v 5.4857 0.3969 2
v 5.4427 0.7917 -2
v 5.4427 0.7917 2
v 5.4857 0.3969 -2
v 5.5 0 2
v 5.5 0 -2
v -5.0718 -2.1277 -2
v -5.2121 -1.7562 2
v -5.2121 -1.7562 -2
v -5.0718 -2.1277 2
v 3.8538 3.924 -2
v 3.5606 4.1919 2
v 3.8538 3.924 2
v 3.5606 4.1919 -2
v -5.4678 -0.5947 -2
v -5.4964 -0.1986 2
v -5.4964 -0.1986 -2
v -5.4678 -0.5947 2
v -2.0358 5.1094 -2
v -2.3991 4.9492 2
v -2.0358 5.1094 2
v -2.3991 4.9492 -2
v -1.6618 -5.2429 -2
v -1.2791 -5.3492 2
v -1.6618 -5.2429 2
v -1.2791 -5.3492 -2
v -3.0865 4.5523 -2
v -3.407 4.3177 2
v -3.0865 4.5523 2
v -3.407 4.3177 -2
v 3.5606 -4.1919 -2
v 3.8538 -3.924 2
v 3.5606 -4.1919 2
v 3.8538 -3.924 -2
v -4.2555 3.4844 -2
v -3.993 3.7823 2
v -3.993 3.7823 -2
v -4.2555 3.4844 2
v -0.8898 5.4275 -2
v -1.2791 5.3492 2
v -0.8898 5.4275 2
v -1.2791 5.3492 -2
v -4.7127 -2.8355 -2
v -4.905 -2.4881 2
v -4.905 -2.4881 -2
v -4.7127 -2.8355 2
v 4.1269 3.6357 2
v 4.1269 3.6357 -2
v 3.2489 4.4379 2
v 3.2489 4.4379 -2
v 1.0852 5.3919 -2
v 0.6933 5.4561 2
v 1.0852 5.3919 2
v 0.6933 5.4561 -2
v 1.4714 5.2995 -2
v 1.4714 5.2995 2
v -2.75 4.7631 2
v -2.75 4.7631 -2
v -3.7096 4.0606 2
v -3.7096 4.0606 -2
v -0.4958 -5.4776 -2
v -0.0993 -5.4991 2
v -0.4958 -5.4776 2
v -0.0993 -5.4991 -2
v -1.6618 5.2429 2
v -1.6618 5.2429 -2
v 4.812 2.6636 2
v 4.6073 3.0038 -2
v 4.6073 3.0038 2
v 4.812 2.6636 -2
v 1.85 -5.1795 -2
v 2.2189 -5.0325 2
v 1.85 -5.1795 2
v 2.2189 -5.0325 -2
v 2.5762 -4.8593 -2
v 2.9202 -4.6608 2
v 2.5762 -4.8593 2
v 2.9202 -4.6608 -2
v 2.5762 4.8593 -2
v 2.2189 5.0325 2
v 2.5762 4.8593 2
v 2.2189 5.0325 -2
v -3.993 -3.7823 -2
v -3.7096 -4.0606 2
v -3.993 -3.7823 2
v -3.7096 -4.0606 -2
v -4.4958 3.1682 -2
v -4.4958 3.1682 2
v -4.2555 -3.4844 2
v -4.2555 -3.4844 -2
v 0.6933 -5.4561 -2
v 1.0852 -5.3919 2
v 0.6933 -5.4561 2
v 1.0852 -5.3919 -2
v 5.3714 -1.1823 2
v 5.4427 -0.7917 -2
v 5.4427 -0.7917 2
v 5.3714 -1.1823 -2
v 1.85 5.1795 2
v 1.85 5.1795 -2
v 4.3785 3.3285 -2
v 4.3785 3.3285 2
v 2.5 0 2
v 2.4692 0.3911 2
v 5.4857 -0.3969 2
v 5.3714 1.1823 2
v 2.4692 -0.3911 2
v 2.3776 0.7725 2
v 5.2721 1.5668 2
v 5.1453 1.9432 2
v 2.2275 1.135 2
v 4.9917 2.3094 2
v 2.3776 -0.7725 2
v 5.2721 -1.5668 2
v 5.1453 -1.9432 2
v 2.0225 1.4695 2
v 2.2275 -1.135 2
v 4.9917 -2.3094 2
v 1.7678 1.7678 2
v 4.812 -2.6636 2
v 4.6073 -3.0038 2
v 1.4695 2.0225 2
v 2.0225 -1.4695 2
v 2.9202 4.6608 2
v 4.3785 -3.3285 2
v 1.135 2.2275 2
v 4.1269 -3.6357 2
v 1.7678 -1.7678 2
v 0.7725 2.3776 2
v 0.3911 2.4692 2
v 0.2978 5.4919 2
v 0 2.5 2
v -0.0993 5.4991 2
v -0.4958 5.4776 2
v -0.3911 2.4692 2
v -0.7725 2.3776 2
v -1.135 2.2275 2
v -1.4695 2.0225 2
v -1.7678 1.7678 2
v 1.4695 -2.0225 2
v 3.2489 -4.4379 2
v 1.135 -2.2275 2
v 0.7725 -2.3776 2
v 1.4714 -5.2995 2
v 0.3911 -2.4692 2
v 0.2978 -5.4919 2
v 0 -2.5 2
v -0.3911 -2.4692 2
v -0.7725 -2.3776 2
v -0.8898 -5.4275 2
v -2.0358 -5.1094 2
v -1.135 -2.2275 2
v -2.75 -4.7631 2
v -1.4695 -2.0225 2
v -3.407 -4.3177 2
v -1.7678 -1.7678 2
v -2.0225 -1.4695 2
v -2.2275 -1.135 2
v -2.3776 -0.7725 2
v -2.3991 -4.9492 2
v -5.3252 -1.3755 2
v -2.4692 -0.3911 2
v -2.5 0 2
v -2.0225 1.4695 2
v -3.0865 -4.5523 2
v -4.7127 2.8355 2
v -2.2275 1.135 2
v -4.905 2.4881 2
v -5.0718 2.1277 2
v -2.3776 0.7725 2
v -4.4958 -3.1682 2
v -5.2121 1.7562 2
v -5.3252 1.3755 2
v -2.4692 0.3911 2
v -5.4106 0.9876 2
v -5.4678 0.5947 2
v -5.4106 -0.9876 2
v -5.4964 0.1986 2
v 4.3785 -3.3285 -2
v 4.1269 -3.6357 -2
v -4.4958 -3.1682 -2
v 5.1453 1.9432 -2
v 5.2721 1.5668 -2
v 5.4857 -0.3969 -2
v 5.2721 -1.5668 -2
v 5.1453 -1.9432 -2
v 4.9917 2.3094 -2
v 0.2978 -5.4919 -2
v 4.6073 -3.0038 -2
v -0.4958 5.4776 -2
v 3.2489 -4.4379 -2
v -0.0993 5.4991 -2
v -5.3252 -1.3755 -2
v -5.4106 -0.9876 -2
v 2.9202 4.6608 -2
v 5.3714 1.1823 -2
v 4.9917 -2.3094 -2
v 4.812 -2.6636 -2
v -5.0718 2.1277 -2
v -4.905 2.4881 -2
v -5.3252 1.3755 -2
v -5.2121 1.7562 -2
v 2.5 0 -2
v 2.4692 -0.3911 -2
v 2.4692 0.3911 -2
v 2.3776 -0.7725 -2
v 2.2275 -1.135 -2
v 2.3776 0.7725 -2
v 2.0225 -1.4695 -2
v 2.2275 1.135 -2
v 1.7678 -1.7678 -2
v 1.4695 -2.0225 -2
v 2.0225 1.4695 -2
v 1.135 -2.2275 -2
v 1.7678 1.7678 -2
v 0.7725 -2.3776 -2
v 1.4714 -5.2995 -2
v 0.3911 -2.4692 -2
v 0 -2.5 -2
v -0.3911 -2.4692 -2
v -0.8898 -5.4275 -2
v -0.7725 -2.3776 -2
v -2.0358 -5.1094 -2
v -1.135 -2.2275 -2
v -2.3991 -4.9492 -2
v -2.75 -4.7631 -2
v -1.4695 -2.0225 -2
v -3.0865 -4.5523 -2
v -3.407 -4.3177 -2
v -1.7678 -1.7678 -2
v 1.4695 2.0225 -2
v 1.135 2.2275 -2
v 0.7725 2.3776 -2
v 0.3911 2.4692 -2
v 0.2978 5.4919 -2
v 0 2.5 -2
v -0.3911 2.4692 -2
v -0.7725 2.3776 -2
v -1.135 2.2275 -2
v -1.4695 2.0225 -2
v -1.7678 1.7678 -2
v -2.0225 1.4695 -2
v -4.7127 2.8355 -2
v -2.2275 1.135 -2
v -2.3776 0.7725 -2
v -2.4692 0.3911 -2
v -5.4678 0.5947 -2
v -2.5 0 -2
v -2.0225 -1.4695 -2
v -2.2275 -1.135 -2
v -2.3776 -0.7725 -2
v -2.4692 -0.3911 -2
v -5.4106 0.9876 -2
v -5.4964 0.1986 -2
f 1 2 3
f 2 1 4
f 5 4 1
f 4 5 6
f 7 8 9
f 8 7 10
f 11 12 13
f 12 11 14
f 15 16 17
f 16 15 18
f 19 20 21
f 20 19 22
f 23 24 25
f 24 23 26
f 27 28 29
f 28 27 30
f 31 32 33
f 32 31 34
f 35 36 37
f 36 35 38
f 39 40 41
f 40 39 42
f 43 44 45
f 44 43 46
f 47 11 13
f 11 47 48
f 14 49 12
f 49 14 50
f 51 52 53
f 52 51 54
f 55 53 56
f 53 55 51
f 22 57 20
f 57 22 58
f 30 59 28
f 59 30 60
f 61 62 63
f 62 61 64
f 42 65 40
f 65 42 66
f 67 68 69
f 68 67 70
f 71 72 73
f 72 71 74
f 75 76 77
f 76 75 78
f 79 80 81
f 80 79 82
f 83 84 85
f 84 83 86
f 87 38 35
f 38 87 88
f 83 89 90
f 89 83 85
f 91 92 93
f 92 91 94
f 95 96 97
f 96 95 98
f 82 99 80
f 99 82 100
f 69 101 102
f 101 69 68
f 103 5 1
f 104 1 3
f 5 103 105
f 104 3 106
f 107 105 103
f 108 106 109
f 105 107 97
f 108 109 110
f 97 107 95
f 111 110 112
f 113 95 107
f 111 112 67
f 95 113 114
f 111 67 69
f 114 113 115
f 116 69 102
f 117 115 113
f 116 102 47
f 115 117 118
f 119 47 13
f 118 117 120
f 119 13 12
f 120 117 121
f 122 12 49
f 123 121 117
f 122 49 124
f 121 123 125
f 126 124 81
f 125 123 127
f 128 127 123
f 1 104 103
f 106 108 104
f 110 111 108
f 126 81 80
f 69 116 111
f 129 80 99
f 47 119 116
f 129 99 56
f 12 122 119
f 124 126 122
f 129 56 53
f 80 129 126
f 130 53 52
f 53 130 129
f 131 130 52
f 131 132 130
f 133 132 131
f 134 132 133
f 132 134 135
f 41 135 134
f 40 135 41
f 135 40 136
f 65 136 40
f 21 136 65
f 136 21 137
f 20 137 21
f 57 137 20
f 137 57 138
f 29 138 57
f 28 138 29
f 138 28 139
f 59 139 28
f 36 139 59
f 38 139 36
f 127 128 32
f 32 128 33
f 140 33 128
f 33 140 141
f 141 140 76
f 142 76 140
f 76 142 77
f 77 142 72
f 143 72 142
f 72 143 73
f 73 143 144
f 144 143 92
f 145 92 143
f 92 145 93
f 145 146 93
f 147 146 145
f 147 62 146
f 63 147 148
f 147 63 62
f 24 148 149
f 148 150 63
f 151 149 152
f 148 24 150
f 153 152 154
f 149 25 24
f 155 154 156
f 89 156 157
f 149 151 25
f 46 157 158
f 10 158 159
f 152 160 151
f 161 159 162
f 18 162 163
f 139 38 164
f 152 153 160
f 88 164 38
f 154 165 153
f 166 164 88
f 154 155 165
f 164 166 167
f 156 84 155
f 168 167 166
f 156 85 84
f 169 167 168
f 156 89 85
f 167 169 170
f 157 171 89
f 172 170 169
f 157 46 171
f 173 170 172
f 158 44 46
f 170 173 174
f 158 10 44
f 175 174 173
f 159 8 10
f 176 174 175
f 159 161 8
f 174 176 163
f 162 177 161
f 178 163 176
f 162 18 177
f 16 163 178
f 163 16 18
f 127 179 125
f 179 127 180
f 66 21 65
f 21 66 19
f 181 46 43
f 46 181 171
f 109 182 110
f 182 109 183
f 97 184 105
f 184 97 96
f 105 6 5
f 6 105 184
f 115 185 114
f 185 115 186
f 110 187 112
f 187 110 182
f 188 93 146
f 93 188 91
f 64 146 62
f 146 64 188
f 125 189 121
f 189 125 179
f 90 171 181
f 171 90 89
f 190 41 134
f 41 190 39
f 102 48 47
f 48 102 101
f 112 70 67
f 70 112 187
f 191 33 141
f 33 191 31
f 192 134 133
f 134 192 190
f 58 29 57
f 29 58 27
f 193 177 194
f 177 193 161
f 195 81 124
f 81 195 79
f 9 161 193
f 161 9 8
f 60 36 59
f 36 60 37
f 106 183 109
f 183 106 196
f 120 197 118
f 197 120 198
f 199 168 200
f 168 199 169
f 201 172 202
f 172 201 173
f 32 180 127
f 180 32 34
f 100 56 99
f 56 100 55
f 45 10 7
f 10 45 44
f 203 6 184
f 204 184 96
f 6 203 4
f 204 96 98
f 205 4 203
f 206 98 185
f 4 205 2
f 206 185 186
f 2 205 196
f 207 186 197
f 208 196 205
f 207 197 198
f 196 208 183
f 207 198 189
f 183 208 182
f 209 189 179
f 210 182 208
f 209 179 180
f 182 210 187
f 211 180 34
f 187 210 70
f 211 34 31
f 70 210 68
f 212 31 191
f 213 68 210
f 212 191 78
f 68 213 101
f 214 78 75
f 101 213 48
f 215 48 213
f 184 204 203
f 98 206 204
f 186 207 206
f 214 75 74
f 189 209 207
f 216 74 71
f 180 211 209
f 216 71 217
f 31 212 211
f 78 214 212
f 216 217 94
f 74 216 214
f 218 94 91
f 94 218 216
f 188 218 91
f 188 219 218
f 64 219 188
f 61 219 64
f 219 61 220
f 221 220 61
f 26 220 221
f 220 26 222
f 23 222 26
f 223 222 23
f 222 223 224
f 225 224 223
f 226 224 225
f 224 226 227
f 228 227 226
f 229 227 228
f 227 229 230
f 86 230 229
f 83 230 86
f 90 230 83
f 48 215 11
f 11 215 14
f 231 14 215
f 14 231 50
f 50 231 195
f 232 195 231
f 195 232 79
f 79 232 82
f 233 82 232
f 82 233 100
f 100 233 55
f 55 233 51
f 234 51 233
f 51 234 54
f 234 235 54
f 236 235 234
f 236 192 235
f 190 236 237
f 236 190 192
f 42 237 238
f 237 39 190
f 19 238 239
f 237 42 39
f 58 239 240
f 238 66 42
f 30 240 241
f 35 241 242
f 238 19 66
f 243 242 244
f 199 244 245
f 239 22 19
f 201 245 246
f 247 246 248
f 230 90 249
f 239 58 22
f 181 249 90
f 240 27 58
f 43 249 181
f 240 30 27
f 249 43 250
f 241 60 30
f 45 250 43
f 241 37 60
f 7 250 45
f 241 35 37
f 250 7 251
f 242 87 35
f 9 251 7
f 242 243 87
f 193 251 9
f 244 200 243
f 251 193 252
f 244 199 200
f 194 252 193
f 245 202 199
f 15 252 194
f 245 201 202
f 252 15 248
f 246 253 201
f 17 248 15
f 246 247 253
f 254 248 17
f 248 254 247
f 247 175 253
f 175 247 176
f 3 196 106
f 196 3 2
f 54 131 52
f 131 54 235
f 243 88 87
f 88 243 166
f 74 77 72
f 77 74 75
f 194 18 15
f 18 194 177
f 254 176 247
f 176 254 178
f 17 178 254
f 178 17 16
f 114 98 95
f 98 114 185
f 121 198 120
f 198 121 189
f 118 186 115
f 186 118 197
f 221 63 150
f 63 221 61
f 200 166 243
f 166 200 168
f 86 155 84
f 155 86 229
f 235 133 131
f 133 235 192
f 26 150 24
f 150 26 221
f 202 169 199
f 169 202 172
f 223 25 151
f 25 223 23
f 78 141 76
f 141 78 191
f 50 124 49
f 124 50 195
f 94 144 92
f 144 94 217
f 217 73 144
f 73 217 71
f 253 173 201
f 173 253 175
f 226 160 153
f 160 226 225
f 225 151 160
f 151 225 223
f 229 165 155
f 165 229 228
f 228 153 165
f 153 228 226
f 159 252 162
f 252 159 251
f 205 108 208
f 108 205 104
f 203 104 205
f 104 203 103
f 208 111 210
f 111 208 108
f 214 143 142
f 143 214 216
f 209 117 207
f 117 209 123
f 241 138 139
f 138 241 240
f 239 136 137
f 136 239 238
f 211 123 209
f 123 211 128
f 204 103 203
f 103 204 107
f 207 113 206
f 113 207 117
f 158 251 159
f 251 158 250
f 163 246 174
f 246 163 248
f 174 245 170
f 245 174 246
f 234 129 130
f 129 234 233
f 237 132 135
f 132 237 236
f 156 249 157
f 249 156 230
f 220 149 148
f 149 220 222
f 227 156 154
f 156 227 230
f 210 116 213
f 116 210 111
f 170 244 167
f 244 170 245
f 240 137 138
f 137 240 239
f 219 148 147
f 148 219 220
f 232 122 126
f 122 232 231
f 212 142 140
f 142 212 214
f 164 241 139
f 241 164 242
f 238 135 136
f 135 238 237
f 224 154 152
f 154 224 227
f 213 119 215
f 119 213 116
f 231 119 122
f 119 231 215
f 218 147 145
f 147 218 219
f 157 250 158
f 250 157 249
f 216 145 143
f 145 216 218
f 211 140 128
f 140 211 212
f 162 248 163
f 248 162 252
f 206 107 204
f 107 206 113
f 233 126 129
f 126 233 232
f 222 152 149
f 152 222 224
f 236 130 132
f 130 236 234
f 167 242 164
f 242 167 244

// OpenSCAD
$fa = 2;
$fs = 0.4;

module motor_bearing() {
  color("#6a6a70")
    difference() {
      cylinder(h = 4, d = 11, center = true);
      cylinder(h = 5, d = 5, center = true);
    }
}

motor_bearing();
